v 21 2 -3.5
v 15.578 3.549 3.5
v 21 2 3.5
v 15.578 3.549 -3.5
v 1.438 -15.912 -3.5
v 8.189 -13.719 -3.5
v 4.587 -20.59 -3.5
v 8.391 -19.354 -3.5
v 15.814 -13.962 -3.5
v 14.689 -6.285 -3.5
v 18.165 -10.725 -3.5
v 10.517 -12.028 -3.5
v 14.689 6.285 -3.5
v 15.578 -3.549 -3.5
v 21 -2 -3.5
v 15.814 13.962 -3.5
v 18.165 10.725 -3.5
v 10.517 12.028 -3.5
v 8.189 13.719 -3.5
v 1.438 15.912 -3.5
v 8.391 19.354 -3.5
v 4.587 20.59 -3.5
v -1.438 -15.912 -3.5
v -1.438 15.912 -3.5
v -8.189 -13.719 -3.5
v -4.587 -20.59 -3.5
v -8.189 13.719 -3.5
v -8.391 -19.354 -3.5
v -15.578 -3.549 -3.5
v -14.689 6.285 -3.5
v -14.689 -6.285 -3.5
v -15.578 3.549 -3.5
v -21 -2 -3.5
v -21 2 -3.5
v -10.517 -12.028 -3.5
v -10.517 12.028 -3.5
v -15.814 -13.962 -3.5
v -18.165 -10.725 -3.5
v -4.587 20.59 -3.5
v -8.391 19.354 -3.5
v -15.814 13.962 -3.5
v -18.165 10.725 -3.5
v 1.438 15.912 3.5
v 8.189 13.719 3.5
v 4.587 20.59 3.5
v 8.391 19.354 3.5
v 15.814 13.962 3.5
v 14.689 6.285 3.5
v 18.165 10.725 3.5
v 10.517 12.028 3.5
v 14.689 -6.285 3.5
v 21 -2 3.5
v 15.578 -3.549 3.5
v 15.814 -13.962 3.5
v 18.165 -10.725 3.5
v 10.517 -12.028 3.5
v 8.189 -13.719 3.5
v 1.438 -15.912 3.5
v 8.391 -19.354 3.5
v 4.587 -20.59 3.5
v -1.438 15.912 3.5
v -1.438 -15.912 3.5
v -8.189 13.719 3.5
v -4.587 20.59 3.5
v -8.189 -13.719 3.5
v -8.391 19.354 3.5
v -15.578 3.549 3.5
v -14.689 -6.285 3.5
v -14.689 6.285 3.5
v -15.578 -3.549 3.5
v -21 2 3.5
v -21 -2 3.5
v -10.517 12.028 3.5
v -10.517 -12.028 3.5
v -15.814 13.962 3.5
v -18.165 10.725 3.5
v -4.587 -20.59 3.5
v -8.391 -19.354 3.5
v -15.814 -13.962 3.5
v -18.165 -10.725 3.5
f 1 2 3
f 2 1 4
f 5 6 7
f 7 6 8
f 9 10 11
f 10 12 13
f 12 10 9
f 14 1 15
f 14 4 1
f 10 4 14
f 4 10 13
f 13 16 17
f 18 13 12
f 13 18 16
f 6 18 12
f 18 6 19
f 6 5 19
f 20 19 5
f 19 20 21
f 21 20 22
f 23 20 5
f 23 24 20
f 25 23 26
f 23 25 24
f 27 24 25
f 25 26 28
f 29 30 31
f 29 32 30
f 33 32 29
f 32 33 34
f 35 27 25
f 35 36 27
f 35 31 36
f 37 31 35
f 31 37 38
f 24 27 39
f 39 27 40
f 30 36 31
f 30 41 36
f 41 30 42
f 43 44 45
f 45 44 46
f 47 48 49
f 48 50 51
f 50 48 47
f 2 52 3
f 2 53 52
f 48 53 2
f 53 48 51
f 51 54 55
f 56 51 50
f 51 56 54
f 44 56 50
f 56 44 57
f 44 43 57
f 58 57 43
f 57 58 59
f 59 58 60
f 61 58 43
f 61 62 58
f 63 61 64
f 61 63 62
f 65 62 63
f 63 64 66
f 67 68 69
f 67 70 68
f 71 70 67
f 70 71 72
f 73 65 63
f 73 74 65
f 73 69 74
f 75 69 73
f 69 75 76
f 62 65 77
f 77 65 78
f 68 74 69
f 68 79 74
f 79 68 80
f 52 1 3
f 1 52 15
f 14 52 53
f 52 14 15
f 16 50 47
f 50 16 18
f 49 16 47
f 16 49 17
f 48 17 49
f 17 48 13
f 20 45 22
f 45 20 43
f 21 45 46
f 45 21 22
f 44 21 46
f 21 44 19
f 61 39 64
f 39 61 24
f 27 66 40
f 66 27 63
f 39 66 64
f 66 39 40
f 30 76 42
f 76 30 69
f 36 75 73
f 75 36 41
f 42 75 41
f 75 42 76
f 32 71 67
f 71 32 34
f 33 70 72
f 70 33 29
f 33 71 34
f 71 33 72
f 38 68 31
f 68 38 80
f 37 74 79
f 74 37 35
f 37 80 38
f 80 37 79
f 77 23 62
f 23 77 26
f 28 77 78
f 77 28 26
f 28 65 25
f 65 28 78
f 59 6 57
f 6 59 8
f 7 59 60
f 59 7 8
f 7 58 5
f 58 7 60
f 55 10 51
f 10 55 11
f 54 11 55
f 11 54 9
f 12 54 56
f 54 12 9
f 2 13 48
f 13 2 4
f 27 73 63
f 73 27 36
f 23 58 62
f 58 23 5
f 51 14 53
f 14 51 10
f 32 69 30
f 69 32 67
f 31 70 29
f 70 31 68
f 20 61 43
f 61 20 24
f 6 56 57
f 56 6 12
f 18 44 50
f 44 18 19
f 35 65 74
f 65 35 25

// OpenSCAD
color("#a8b0b2")
union(){
cylinder(7,16,16,$fn=30,center= true);

for (i=[0:45:359]) {
    r = 14; // pattern radius
    n = 10; // number of cars
step = 360/n;
for (i=[0:step:359]) {
    angle = i;
    dx = r*cos(angle);
    dy = r*sin(angle);
    translate([dx,dy,0])
    rotate([0,0,angle])
   
    {
 
  
// #linear_extrude(7, scale = 1, center = true)
linear_extrude(7, scale = 1, center = true)
polygon(points=[[0,-4],[7,-2],[7,2],[0,4]]);
     
}    
 
}
}
}

/*
color("blue"){
translate([14,0,0])
%linear_extrude(8, scale = 1, center = true)
polygon(points=[[0,-4],[7,-2],[7,2],[0,4]]);
}
*/
